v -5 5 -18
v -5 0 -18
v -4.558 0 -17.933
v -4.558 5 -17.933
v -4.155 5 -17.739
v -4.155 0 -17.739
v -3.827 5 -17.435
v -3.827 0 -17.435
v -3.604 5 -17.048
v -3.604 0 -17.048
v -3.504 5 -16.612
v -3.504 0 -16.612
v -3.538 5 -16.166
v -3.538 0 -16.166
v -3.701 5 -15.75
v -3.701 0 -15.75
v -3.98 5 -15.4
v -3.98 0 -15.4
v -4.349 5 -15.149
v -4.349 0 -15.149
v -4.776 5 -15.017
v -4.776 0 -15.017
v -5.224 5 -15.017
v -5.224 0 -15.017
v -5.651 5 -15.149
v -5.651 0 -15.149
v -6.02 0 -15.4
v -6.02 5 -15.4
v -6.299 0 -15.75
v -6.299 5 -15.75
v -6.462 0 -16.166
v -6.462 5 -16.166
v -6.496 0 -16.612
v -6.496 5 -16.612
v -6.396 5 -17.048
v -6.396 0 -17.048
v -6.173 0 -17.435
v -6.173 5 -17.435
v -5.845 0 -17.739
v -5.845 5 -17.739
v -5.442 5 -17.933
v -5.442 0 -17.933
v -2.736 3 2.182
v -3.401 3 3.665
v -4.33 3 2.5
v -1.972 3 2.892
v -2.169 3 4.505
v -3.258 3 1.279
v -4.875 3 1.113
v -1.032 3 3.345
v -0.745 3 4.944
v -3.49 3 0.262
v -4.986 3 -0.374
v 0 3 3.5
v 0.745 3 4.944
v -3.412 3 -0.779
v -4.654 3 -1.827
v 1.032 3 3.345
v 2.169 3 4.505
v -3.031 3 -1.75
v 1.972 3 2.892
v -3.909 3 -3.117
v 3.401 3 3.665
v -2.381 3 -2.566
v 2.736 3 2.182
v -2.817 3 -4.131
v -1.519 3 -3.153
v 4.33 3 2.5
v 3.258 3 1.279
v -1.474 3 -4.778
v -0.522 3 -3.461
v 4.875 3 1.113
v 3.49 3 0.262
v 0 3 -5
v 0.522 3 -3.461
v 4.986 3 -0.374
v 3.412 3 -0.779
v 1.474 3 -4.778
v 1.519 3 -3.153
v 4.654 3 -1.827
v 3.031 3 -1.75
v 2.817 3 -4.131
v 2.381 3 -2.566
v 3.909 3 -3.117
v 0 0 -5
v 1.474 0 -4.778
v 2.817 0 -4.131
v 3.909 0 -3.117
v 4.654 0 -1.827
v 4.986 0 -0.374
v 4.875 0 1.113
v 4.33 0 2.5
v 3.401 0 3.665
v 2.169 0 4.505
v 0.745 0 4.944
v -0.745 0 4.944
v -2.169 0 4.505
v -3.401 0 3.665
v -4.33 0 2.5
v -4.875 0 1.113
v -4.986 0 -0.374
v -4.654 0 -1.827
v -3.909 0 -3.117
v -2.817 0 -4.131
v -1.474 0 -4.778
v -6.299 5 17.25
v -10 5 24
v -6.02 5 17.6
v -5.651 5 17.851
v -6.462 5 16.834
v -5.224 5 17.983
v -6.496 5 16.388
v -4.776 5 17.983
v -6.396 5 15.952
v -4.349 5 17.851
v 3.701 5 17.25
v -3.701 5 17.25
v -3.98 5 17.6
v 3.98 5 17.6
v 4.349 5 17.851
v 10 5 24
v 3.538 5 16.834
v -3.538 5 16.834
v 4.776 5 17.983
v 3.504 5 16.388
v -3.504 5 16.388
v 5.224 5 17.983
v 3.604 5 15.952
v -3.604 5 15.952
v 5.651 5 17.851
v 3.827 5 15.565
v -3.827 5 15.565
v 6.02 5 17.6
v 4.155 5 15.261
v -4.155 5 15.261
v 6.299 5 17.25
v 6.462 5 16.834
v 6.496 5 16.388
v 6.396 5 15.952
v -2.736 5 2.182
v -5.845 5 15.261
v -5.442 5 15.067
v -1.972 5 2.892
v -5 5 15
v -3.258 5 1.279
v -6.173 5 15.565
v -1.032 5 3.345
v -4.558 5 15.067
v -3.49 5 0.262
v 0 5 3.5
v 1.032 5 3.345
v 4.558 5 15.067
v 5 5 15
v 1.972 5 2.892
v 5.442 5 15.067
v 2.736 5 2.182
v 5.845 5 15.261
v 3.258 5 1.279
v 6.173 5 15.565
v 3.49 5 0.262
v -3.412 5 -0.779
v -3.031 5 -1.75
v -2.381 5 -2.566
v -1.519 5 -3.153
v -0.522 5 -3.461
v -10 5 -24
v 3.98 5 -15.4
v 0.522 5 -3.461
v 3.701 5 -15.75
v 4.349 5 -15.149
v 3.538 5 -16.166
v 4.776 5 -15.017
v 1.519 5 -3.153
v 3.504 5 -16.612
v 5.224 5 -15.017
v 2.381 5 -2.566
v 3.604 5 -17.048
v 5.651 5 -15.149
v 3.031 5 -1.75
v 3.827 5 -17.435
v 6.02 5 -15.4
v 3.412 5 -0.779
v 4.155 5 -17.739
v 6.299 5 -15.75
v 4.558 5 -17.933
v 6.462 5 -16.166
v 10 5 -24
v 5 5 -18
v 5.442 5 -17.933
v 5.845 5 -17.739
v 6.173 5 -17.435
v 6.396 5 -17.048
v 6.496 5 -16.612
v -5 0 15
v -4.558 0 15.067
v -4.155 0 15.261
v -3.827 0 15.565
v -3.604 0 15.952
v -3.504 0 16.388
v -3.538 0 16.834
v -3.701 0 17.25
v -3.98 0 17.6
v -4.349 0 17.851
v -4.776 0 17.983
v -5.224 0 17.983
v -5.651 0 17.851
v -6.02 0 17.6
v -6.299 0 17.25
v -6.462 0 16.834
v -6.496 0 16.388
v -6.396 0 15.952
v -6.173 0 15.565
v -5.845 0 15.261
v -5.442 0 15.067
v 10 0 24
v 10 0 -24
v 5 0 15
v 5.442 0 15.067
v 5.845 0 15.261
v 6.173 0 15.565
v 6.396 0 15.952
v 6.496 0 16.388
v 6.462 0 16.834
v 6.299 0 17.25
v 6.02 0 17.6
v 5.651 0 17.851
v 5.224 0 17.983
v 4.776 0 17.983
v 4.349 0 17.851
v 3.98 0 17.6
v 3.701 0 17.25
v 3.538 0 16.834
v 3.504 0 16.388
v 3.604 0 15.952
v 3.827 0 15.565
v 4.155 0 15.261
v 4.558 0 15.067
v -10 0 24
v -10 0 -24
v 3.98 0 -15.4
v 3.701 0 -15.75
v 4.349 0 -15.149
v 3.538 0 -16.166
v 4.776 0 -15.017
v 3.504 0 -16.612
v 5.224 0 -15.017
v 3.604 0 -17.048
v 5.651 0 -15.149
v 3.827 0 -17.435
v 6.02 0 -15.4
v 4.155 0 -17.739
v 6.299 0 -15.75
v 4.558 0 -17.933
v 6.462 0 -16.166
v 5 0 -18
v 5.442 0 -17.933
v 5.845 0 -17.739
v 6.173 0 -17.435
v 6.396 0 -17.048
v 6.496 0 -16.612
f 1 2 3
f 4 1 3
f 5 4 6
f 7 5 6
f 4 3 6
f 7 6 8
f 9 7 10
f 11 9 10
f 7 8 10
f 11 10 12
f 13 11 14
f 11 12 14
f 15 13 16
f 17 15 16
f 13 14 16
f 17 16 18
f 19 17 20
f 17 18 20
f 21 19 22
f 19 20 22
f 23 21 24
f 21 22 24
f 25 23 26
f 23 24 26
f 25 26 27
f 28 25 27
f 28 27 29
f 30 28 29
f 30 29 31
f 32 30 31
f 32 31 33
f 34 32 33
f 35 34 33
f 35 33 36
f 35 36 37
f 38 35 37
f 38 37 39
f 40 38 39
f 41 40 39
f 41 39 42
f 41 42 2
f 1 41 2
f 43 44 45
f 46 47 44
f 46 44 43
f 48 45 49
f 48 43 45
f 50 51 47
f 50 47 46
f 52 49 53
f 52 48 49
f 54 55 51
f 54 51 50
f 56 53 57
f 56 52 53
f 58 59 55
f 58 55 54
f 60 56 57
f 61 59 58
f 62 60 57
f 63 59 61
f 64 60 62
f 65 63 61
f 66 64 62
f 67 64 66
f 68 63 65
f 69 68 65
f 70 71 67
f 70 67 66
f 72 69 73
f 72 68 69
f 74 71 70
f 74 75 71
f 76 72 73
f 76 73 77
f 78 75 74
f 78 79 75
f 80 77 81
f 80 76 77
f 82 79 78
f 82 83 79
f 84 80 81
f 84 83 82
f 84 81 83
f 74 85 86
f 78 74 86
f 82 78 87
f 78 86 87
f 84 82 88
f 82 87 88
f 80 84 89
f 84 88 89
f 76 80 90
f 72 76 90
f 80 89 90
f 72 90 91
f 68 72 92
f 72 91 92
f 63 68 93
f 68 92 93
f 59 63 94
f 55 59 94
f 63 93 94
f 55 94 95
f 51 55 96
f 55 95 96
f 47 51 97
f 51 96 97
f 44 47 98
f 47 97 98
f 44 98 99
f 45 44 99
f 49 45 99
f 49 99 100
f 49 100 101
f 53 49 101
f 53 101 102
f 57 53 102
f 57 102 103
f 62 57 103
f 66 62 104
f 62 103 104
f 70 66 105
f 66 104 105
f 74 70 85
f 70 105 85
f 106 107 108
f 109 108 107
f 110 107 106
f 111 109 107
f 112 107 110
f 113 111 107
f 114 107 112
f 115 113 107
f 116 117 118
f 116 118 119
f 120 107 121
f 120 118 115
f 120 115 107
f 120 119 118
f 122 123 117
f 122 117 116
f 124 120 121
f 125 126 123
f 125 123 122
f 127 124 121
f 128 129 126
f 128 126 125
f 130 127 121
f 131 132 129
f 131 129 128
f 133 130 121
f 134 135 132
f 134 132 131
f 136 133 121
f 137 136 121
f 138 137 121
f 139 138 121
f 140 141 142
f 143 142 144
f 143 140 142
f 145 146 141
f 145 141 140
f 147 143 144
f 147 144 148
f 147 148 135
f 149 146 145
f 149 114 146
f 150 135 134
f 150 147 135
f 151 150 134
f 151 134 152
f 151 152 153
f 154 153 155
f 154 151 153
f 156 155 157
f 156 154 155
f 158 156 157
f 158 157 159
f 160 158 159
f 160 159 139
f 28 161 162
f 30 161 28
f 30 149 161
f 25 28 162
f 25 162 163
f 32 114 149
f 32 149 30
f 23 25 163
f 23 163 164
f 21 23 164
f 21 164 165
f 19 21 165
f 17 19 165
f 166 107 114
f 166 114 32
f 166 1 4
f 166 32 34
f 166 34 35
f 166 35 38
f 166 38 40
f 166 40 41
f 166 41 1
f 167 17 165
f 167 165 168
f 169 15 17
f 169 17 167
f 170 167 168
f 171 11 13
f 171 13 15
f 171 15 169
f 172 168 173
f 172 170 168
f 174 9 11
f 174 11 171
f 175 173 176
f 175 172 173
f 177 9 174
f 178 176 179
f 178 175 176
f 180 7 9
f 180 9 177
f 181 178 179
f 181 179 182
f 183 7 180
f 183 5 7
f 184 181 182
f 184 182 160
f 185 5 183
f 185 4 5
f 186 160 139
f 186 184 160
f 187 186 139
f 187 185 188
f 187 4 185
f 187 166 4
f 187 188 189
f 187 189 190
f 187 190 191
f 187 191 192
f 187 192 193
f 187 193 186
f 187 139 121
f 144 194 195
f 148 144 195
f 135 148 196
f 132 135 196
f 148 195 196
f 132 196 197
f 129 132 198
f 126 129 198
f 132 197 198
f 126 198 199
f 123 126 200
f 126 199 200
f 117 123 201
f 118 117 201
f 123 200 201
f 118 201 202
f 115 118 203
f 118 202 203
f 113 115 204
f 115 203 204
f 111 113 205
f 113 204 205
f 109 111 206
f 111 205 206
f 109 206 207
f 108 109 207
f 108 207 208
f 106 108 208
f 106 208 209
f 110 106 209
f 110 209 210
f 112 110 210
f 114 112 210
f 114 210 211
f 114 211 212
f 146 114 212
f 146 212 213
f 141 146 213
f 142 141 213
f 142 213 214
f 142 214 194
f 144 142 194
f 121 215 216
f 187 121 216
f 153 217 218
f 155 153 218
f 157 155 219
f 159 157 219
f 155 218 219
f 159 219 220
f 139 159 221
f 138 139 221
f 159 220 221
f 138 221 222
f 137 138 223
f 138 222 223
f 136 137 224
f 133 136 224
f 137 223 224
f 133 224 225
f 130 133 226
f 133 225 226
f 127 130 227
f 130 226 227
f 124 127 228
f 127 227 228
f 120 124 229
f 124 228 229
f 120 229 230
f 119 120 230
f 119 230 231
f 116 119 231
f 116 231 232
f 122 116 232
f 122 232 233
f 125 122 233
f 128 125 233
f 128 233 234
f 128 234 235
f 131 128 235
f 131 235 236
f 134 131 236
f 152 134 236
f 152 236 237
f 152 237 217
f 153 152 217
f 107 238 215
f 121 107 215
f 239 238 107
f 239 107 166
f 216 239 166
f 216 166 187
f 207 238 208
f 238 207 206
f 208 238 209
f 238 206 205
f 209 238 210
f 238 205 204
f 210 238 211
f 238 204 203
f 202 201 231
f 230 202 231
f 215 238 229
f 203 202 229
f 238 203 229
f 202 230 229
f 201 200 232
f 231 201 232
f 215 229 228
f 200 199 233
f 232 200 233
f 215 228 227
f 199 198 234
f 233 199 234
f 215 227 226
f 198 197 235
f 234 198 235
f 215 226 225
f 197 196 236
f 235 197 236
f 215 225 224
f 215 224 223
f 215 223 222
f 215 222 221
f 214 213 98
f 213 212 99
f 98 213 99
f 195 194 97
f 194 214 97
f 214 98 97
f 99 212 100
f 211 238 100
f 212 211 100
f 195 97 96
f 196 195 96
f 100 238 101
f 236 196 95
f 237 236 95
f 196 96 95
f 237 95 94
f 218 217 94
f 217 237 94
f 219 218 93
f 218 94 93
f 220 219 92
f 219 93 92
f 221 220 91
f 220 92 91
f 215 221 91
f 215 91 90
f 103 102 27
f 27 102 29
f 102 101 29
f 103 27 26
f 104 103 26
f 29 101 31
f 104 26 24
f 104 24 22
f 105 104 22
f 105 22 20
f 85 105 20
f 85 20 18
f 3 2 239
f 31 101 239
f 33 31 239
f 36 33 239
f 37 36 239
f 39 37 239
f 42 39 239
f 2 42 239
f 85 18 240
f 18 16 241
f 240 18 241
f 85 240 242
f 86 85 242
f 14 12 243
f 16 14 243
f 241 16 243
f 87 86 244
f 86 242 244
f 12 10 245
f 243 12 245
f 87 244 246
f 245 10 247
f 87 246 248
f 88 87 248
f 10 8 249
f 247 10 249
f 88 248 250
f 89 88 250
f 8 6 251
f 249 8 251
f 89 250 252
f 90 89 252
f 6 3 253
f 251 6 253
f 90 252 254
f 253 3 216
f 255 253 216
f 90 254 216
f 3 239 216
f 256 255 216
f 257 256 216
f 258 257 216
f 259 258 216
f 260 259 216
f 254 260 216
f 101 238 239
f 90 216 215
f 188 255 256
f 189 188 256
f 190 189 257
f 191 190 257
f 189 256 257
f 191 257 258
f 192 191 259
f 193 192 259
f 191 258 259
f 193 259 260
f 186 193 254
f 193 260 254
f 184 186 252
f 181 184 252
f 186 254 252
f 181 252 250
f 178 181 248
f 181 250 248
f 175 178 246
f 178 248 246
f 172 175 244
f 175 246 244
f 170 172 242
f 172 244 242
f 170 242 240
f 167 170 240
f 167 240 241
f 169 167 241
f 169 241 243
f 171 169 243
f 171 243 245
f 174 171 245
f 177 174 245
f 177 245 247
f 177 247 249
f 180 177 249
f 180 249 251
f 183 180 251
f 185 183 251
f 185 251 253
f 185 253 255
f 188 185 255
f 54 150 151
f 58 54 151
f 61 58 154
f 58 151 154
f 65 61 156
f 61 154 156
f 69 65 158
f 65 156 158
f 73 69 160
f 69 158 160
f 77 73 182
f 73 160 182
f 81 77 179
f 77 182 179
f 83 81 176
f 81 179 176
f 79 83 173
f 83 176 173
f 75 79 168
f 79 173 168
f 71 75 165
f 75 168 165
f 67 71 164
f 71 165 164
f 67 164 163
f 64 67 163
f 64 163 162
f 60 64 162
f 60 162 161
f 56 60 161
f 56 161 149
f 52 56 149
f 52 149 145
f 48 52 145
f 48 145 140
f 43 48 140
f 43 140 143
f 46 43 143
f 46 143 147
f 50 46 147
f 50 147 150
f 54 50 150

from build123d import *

# Parameters (mm, degrees)
SKETCH1_W           = 20
SKETCH1_H           = 48
BOSS_EXTRUDE1_DEPTH = 5
SKETCH2_R           = 3.5
CUT_EXTRUDE1_DEPTH  = 27.47640459
SKETCH3_R           = 5
CUT_EXTRUDE2_DEPTH  = 3
SKETCH4_R           = 1.5
CUT_EXTRUDE3_DEPTH  = 27.47640459


with BuildPart() as part:
    # Sketch1 → Boss-Extrude1 (new body)
    with BuildSketch(Plane(origin=(0, 0, 0), x_dir=(1, 0, 0), z_dir=(0, 1, 0))):
        Rectangle(SKETCH1_W, SKETCH1_H)
    extrude(amount=BOSS_EXTRUDE1_DEPTH)

    # Sketch2 → Cut-Extrude1 (cut, through all)
    with BuildSketch(Plane(origin=(0, 5, 0), x_dir=(1, 0, 0), z_dir=(0, 1, 0))):
        with Locations(Location((0, 0, 0), (0, 0, 270))):
            Circle(SKETCH2_R)
    extrude(amount=-CUT_EXTRUDE1_DEPTH, mode=Mode.SUBTRACT)

    # Sketch3 → Cut-Extrude2 (cut)
    with BuildSketch(Plane.XZ):
        with Locations(Location((0, 0, 0), (0, 0, 270))):
            Circle(SKETCH3_R)
    extrude(amount=-CUT_EXTRUDE2_DEPTH, mode=Mode.SUBTRACT)

    # Sketch4 → Cut-Extrude3 (cut, through all)
    with BuildSketch(Plane.XZ):
        with Locations(Location((5, -16.5, 0), (0, 0, 270))):
            Circle(SKETCH4_R)
        with Locations(Location((-5, -16.5, 0), (0, 0, 270))):
            Circle(SKETCH4_R)
        with Locations(Location((-5, 16.5, 0), (0, 0, 270))):
            Circle(SKETCH4_R)
        with Locations(Location((5, 16.5, 0), (0, 0, 270))):
            Circle(SKETCH4_R)
    extrude(amount=-CUT_EXTRUDE3_DEPTH, mode=Mode.SUBTRACT)


solid = part.part
